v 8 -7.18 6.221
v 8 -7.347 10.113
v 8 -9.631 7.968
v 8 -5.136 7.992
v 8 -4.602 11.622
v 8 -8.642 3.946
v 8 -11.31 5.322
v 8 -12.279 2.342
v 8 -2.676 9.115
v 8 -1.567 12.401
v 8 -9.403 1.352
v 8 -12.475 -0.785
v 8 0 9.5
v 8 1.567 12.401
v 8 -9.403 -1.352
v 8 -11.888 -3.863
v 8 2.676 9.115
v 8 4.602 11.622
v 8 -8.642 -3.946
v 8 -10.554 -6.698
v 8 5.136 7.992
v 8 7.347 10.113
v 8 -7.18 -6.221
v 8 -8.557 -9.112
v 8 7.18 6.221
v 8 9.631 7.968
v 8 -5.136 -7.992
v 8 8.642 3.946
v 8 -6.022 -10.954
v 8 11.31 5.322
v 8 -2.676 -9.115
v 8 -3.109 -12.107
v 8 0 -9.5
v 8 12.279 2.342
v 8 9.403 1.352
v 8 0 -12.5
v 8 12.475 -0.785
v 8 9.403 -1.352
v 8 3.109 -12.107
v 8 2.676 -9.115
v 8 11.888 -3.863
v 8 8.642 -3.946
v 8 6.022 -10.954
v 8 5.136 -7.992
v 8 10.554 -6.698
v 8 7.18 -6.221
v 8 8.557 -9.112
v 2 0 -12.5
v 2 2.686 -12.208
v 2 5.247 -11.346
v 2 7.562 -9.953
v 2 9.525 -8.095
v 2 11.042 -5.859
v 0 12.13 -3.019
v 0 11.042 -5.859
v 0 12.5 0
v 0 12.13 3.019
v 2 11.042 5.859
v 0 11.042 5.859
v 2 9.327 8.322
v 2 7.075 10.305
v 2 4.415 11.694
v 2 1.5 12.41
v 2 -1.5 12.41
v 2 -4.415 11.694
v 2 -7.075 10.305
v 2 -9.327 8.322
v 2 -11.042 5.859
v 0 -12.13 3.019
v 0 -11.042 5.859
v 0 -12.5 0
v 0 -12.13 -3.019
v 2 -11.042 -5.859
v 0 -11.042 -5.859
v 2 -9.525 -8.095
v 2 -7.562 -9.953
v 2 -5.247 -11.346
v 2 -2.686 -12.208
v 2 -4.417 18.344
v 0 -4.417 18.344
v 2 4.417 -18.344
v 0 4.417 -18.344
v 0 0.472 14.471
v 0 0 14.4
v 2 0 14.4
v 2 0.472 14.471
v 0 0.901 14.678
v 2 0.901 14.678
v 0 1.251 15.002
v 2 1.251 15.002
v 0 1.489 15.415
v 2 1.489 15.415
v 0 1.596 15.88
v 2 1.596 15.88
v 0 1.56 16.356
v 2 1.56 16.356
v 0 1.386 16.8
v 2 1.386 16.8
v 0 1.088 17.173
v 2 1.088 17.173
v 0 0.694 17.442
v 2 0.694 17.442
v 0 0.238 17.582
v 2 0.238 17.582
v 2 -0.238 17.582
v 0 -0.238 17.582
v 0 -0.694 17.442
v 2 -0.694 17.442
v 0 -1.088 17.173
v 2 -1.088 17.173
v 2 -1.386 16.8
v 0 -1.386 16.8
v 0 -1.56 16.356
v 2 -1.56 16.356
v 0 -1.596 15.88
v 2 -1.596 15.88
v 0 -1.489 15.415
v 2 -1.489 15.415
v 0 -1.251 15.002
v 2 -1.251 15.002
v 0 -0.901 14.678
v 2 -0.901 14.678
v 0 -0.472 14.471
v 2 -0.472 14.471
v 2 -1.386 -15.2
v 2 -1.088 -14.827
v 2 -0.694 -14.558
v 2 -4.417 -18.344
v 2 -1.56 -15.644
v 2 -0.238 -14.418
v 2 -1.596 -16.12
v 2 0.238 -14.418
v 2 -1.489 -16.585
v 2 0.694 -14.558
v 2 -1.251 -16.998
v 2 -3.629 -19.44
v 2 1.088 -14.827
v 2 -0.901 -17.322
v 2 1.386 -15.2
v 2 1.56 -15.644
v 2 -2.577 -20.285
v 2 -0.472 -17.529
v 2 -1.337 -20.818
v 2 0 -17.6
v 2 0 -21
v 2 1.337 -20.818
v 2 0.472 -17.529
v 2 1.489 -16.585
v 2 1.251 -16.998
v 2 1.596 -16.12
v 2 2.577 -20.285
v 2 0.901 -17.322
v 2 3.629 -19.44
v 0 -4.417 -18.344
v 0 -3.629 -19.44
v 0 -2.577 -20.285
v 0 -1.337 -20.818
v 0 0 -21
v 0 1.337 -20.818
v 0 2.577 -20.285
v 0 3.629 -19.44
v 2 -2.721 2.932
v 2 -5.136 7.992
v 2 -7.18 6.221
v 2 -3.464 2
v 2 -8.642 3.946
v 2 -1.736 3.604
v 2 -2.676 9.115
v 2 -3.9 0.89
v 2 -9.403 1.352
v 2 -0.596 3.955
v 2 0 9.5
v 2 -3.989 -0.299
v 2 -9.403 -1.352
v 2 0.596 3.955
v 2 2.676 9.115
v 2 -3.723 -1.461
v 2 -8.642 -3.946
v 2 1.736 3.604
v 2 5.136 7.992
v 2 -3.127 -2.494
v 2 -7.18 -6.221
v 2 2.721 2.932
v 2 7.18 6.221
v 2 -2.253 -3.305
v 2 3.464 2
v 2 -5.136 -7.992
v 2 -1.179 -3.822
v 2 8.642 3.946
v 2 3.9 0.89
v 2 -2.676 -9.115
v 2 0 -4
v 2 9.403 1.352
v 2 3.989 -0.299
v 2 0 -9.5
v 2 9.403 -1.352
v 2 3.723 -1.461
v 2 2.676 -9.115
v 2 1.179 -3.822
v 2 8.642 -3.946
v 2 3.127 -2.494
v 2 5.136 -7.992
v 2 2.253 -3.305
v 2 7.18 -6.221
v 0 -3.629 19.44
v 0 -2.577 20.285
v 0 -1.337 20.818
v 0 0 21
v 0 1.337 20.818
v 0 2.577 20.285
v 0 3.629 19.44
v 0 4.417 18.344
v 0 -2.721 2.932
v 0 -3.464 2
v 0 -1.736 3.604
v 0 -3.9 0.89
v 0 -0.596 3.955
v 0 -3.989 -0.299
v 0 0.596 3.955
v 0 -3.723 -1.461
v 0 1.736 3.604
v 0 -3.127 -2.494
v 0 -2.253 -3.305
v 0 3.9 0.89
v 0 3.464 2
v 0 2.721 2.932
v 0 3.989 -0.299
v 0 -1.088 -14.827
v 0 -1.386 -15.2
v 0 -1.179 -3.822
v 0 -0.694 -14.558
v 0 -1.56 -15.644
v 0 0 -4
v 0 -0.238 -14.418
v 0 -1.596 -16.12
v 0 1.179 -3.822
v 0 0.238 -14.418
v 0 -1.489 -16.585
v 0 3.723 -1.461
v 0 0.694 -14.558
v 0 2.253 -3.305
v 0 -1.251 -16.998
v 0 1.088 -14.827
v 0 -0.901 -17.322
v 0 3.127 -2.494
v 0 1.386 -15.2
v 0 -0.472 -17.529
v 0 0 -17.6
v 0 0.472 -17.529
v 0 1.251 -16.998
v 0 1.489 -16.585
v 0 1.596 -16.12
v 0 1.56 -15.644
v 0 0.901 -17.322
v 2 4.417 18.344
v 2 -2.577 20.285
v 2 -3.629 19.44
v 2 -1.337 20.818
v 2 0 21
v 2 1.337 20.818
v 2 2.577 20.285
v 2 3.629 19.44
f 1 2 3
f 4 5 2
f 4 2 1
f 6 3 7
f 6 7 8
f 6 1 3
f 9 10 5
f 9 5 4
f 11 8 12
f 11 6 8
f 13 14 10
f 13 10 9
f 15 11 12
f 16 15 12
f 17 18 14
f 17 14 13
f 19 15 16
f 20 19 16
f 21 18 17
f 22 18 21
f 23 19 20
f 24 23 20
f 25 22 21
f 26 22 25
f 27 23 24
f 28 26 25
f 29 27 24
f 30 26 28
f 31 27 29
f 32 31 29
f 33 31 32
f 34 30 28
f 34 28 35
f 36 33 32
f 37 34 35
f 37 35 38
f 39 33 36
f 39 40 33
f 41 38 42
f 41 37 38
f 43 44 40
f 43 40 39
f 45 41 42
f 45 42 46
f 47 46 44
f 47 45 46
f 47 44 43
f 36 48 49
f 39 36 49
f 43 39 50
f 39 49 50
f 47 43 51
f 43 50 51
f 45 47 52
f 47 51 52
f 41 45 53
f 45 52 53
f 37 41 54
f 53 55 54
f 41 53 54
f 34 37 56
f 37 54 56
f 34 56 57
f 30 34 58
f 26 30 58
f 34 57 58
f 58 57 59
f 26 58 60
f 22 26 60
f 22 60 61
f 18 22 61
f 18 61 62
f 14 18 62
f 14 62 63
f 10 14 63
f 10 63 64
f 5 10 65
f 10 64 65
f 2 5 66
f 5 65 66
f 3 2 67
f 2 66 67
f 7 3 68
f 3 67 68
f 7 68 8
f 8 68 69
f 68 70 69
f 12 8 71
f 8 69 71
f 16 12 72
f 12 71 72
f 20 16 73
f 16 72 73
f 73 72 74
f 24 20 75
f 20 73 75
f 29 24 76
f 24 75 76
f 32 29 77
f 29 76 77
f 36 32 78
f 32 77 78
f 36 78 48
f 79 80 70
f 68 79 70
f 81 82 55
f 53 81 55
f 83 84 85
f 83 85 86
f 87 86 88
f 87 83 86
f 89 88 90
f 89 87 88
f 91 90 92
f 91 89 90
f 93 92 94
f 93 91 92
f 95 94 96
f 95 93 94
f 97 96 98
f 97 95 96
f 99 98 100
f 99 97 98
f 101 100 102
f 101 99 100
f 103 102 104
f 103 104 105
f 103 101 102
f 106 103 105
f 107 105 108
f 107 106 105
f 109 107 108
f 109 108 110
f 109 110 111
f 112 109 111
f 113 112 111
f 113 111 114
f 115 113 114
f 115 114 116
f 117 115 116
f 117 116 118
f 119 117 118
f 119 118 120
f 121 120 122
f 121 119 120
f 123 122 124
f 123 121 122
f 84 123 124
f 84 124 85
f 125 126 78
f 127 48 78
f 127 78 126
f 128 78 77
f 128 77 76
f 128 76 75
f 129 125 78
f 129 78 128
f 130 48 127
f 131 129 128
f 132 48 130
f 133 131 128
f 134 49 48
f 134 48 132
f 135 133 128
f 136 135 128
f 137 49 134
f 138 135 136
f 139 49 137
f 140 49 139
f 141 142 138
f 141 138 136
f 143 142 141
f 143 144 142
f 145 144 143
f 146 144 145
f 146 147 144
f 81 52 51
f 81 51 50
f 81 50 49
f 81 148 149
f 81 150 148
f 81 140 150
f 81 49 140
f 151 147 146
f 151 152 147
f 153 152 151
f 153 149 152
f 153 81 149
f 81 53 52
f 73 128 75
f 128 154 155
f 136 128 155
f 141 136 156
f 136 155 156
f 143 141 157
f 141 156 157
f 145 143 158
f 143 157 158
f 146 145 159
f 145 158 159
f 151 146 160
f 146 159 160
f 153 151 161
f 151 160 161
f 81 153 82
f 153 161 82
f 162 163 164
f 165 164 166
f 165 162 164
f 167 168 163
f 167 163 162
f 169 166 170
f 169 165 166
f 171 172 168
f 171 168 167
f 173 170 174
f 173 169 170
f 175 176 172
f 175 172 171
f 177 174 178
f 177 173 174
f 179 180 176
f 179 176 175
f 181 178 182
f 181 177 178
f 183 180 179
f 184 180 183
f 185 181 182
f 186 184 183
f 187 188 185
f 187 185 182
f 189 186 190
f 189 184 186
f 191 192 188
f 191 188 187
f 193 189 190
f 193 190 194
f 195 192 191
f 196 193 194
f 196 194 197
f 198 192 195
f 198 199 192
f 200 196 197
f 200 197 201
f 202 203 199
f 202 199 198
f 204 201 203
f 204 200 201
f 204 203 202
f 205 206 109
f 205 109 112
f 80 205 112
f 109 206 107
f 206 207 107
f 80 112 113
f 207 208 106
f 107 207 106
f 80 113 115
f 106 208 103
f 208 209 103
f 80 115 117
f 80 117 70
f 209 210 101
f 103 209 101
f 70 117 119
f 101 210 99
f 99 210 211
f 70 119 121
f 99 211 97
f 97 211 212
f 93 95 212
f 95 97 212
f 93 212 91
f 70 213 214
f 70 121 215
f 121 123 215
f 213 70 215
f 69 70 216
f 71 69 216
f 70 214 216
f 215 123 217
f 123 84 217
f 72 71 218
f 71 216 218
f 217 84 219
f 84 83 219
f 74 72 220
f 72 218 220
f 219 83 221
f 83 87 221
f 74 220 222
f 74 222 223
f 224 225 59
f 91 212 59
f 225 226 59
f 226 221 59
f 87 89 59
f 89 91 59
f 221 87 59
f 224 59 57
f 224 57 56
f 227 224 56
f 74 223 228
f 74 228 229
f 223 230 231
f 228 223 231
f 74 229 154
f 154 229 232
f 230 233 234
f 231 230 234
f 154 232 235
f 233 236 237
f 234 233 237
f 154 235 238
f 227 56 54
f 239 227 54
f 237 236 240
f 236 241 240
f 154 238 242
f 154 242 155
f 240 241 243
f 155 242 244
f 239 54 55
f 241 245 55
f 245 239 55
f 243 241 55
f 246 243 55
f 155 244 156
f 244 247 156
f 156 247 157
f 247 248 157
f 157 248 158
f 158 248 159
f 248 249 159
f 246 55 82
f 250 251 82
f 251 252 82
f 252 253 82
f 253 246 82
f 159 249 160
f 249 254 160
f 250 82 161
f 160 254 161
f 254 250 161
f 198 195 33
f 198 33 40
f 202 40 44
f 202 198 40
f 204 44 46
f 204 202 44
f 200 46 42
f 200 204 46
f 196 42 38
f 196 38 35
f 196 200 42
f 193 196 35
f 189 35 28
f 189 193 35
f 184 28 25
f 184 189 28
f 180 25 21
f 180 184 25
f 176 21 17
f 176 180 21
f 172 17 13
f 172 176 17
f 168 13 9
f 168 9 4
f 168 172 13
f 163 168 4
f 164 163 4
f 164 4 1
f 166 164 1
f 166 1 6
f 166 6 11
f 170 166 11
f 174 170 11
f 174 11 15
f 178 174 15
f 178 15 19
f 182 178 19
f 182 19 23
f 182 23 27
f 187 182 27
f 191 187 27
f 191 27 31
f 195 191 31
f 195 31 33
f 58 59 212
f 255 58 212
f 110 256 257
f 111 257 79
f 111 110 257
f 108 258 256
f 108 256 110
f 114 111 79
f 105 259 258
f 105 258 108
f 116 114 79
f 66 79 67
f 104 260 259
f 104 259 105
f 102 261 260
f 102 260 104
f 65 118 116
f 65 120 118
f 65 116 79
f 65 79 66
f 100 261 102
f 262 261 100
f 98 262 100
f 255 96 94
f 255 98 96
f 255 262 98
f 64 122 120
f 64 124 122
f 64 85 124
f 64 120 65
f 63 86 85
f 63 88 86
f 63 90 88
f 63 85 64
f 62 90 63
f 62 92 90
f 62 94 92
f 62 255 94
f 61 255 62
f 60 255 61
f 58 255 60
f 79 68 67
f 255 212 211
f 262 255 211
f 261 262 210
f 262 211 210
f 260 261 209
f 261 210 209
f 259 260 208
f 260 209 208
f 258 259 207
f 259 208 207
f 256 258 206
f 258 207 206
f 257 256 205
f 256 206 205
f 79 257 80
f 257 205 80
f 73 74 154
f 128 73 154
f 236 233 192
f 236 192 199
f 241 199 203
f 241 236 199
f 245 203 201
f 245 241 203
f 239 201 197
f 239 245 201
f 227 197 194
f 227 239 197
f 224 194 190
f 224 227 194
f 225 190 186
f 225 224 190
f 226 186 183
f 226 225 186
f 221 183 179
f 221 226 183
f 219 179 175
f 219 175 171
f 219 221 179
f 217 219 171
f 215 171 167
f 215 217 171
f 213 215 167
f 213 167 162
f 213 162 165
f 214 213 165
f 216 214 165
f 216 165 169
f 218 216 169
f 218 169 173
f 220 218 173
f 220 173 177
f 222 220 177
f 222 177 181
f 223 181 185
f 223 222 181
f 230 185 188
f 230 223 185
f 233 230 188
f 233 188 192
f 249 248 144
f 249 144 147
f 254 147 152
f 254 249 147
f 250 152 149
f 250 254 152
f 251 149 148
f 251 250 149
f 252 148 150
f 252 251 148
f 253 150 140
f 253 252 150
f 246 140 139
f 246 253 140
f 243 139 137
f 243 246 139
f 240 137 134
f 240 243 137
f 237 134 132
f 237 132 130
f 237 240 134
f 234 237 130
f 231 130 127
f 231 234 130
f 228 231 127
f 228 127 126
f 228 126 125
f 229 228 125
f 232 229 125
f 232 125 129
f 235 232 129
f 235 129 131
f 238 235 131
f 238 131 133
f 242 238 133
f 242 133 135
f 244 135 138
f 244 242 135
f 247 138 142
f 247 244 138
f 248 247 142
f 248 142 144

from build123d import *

# Parameters (mm, degrees)
SKETCH1_R             = 1.6
BOSS_EXTRUDE1_DEPTH   = 2
BOSS_EXTRUDE1_2_DEPTH = 2
SKETCH1_5_R           = 12.5
SKETCH1_5_R_2         = 9.5
BOSS_EXTRUDE2_DEPTH   = 8
SKETCH1_6_R           = 9.5
SKETCH1_6_R_2         = 4
BOSS_EXTRUDE3_DEPTH   = 2


with BuildPart() as part:
    # Sketch1 → Boss-Extrude1 (new body)
    with BuildSketch(Plane(origin=(0, 0, 0), x_dir=(0, 0, -1), z_dir=(1, 0, 0))):
        with BuildLine():
            Line((-5.859375, 11.041635957), (-18.34375, 4.416654383))
            ThreePointArc((-18.34375, 4.416654383), (-21, 0), (-18.34375, -4.416654383))
            Line((-18.34375, -4.416654383), (-5.859375, -11.041635957))
            ThreePointArc((-5.859375, -11.041635957), (-12.5, 0), (-5.859375, 11.041635957))
        make_face()
        with Locations((-16, 0)):
            Circle(SKETCH1_R, mode=Mode.SUBTRACT)
    extrude(amount=BOSS_EXTRUDE1_DEPTH)



with BuildPart() as body_2:
    # Sketch1 → Boss-Extrude1 2 (new body)
    with BuildSketch(Plane(origin=(0, 0, 0), x_dir=(0, 0, -1), z_dir=(1, 0, 0))):
        with BuildLine():
            Line((18.34375, 4.416654383), (5.859375, 11.041635957))
            ThreePointArc((5.859375, 11.041635957), (10.711960313, 6.44235254), (12.5, 0))
            ThreePointArc((12.5, 0), (10.711960313, -6.44235254), (5.859375, -11.041635957))
            Line((5.859375, -11.041635957), (18.34375, -4.416654383))
            ThreePointArc((18.34375, -4.416654383), (21, 0), (18.34375, 4.416654383))
        make_face()
        with Locations((16, 0)):
            Circle(SKETCH1_R, mode=Mode.SUBTRACT)
    extrude(amount=BOSS_EXTRUDE1_2_DEPTH)


with BuildPart() as part_1:
    add(part.part)

    add(body_2.part)  # Boss-Extrude2 merges body 2
    # Sketch1<5> → Boss-Extrude2 (add)
    with BuildSketch(Plane(origin=(0, 0, 0), x_dir=(0, 0, -1), z_dir=(1, 0, 0))):
        Circle(SKETCH1_5_R)
        Circle(SKETCH1_5_R_2, mode=Mode.SUBTRACT)
    extrude(amount=BOSS_EXTRUDE2_DEPTH)

    # Sketch1<6> → Boss-Extrude3 (add)
    with BuildSketch(Plane(origin=(0, 0, 0), x_dir=(0, 0, -1), z_dir=(1, 0, 0))):
        Circle(SKETCH1_6_R)
        Circle(SKETCH1_6_R_2, mode=Mode.SUBTRACT)
    extrude(amount=BOSS_EXTRUDE3_DEPTH)


solid = part_1.part
